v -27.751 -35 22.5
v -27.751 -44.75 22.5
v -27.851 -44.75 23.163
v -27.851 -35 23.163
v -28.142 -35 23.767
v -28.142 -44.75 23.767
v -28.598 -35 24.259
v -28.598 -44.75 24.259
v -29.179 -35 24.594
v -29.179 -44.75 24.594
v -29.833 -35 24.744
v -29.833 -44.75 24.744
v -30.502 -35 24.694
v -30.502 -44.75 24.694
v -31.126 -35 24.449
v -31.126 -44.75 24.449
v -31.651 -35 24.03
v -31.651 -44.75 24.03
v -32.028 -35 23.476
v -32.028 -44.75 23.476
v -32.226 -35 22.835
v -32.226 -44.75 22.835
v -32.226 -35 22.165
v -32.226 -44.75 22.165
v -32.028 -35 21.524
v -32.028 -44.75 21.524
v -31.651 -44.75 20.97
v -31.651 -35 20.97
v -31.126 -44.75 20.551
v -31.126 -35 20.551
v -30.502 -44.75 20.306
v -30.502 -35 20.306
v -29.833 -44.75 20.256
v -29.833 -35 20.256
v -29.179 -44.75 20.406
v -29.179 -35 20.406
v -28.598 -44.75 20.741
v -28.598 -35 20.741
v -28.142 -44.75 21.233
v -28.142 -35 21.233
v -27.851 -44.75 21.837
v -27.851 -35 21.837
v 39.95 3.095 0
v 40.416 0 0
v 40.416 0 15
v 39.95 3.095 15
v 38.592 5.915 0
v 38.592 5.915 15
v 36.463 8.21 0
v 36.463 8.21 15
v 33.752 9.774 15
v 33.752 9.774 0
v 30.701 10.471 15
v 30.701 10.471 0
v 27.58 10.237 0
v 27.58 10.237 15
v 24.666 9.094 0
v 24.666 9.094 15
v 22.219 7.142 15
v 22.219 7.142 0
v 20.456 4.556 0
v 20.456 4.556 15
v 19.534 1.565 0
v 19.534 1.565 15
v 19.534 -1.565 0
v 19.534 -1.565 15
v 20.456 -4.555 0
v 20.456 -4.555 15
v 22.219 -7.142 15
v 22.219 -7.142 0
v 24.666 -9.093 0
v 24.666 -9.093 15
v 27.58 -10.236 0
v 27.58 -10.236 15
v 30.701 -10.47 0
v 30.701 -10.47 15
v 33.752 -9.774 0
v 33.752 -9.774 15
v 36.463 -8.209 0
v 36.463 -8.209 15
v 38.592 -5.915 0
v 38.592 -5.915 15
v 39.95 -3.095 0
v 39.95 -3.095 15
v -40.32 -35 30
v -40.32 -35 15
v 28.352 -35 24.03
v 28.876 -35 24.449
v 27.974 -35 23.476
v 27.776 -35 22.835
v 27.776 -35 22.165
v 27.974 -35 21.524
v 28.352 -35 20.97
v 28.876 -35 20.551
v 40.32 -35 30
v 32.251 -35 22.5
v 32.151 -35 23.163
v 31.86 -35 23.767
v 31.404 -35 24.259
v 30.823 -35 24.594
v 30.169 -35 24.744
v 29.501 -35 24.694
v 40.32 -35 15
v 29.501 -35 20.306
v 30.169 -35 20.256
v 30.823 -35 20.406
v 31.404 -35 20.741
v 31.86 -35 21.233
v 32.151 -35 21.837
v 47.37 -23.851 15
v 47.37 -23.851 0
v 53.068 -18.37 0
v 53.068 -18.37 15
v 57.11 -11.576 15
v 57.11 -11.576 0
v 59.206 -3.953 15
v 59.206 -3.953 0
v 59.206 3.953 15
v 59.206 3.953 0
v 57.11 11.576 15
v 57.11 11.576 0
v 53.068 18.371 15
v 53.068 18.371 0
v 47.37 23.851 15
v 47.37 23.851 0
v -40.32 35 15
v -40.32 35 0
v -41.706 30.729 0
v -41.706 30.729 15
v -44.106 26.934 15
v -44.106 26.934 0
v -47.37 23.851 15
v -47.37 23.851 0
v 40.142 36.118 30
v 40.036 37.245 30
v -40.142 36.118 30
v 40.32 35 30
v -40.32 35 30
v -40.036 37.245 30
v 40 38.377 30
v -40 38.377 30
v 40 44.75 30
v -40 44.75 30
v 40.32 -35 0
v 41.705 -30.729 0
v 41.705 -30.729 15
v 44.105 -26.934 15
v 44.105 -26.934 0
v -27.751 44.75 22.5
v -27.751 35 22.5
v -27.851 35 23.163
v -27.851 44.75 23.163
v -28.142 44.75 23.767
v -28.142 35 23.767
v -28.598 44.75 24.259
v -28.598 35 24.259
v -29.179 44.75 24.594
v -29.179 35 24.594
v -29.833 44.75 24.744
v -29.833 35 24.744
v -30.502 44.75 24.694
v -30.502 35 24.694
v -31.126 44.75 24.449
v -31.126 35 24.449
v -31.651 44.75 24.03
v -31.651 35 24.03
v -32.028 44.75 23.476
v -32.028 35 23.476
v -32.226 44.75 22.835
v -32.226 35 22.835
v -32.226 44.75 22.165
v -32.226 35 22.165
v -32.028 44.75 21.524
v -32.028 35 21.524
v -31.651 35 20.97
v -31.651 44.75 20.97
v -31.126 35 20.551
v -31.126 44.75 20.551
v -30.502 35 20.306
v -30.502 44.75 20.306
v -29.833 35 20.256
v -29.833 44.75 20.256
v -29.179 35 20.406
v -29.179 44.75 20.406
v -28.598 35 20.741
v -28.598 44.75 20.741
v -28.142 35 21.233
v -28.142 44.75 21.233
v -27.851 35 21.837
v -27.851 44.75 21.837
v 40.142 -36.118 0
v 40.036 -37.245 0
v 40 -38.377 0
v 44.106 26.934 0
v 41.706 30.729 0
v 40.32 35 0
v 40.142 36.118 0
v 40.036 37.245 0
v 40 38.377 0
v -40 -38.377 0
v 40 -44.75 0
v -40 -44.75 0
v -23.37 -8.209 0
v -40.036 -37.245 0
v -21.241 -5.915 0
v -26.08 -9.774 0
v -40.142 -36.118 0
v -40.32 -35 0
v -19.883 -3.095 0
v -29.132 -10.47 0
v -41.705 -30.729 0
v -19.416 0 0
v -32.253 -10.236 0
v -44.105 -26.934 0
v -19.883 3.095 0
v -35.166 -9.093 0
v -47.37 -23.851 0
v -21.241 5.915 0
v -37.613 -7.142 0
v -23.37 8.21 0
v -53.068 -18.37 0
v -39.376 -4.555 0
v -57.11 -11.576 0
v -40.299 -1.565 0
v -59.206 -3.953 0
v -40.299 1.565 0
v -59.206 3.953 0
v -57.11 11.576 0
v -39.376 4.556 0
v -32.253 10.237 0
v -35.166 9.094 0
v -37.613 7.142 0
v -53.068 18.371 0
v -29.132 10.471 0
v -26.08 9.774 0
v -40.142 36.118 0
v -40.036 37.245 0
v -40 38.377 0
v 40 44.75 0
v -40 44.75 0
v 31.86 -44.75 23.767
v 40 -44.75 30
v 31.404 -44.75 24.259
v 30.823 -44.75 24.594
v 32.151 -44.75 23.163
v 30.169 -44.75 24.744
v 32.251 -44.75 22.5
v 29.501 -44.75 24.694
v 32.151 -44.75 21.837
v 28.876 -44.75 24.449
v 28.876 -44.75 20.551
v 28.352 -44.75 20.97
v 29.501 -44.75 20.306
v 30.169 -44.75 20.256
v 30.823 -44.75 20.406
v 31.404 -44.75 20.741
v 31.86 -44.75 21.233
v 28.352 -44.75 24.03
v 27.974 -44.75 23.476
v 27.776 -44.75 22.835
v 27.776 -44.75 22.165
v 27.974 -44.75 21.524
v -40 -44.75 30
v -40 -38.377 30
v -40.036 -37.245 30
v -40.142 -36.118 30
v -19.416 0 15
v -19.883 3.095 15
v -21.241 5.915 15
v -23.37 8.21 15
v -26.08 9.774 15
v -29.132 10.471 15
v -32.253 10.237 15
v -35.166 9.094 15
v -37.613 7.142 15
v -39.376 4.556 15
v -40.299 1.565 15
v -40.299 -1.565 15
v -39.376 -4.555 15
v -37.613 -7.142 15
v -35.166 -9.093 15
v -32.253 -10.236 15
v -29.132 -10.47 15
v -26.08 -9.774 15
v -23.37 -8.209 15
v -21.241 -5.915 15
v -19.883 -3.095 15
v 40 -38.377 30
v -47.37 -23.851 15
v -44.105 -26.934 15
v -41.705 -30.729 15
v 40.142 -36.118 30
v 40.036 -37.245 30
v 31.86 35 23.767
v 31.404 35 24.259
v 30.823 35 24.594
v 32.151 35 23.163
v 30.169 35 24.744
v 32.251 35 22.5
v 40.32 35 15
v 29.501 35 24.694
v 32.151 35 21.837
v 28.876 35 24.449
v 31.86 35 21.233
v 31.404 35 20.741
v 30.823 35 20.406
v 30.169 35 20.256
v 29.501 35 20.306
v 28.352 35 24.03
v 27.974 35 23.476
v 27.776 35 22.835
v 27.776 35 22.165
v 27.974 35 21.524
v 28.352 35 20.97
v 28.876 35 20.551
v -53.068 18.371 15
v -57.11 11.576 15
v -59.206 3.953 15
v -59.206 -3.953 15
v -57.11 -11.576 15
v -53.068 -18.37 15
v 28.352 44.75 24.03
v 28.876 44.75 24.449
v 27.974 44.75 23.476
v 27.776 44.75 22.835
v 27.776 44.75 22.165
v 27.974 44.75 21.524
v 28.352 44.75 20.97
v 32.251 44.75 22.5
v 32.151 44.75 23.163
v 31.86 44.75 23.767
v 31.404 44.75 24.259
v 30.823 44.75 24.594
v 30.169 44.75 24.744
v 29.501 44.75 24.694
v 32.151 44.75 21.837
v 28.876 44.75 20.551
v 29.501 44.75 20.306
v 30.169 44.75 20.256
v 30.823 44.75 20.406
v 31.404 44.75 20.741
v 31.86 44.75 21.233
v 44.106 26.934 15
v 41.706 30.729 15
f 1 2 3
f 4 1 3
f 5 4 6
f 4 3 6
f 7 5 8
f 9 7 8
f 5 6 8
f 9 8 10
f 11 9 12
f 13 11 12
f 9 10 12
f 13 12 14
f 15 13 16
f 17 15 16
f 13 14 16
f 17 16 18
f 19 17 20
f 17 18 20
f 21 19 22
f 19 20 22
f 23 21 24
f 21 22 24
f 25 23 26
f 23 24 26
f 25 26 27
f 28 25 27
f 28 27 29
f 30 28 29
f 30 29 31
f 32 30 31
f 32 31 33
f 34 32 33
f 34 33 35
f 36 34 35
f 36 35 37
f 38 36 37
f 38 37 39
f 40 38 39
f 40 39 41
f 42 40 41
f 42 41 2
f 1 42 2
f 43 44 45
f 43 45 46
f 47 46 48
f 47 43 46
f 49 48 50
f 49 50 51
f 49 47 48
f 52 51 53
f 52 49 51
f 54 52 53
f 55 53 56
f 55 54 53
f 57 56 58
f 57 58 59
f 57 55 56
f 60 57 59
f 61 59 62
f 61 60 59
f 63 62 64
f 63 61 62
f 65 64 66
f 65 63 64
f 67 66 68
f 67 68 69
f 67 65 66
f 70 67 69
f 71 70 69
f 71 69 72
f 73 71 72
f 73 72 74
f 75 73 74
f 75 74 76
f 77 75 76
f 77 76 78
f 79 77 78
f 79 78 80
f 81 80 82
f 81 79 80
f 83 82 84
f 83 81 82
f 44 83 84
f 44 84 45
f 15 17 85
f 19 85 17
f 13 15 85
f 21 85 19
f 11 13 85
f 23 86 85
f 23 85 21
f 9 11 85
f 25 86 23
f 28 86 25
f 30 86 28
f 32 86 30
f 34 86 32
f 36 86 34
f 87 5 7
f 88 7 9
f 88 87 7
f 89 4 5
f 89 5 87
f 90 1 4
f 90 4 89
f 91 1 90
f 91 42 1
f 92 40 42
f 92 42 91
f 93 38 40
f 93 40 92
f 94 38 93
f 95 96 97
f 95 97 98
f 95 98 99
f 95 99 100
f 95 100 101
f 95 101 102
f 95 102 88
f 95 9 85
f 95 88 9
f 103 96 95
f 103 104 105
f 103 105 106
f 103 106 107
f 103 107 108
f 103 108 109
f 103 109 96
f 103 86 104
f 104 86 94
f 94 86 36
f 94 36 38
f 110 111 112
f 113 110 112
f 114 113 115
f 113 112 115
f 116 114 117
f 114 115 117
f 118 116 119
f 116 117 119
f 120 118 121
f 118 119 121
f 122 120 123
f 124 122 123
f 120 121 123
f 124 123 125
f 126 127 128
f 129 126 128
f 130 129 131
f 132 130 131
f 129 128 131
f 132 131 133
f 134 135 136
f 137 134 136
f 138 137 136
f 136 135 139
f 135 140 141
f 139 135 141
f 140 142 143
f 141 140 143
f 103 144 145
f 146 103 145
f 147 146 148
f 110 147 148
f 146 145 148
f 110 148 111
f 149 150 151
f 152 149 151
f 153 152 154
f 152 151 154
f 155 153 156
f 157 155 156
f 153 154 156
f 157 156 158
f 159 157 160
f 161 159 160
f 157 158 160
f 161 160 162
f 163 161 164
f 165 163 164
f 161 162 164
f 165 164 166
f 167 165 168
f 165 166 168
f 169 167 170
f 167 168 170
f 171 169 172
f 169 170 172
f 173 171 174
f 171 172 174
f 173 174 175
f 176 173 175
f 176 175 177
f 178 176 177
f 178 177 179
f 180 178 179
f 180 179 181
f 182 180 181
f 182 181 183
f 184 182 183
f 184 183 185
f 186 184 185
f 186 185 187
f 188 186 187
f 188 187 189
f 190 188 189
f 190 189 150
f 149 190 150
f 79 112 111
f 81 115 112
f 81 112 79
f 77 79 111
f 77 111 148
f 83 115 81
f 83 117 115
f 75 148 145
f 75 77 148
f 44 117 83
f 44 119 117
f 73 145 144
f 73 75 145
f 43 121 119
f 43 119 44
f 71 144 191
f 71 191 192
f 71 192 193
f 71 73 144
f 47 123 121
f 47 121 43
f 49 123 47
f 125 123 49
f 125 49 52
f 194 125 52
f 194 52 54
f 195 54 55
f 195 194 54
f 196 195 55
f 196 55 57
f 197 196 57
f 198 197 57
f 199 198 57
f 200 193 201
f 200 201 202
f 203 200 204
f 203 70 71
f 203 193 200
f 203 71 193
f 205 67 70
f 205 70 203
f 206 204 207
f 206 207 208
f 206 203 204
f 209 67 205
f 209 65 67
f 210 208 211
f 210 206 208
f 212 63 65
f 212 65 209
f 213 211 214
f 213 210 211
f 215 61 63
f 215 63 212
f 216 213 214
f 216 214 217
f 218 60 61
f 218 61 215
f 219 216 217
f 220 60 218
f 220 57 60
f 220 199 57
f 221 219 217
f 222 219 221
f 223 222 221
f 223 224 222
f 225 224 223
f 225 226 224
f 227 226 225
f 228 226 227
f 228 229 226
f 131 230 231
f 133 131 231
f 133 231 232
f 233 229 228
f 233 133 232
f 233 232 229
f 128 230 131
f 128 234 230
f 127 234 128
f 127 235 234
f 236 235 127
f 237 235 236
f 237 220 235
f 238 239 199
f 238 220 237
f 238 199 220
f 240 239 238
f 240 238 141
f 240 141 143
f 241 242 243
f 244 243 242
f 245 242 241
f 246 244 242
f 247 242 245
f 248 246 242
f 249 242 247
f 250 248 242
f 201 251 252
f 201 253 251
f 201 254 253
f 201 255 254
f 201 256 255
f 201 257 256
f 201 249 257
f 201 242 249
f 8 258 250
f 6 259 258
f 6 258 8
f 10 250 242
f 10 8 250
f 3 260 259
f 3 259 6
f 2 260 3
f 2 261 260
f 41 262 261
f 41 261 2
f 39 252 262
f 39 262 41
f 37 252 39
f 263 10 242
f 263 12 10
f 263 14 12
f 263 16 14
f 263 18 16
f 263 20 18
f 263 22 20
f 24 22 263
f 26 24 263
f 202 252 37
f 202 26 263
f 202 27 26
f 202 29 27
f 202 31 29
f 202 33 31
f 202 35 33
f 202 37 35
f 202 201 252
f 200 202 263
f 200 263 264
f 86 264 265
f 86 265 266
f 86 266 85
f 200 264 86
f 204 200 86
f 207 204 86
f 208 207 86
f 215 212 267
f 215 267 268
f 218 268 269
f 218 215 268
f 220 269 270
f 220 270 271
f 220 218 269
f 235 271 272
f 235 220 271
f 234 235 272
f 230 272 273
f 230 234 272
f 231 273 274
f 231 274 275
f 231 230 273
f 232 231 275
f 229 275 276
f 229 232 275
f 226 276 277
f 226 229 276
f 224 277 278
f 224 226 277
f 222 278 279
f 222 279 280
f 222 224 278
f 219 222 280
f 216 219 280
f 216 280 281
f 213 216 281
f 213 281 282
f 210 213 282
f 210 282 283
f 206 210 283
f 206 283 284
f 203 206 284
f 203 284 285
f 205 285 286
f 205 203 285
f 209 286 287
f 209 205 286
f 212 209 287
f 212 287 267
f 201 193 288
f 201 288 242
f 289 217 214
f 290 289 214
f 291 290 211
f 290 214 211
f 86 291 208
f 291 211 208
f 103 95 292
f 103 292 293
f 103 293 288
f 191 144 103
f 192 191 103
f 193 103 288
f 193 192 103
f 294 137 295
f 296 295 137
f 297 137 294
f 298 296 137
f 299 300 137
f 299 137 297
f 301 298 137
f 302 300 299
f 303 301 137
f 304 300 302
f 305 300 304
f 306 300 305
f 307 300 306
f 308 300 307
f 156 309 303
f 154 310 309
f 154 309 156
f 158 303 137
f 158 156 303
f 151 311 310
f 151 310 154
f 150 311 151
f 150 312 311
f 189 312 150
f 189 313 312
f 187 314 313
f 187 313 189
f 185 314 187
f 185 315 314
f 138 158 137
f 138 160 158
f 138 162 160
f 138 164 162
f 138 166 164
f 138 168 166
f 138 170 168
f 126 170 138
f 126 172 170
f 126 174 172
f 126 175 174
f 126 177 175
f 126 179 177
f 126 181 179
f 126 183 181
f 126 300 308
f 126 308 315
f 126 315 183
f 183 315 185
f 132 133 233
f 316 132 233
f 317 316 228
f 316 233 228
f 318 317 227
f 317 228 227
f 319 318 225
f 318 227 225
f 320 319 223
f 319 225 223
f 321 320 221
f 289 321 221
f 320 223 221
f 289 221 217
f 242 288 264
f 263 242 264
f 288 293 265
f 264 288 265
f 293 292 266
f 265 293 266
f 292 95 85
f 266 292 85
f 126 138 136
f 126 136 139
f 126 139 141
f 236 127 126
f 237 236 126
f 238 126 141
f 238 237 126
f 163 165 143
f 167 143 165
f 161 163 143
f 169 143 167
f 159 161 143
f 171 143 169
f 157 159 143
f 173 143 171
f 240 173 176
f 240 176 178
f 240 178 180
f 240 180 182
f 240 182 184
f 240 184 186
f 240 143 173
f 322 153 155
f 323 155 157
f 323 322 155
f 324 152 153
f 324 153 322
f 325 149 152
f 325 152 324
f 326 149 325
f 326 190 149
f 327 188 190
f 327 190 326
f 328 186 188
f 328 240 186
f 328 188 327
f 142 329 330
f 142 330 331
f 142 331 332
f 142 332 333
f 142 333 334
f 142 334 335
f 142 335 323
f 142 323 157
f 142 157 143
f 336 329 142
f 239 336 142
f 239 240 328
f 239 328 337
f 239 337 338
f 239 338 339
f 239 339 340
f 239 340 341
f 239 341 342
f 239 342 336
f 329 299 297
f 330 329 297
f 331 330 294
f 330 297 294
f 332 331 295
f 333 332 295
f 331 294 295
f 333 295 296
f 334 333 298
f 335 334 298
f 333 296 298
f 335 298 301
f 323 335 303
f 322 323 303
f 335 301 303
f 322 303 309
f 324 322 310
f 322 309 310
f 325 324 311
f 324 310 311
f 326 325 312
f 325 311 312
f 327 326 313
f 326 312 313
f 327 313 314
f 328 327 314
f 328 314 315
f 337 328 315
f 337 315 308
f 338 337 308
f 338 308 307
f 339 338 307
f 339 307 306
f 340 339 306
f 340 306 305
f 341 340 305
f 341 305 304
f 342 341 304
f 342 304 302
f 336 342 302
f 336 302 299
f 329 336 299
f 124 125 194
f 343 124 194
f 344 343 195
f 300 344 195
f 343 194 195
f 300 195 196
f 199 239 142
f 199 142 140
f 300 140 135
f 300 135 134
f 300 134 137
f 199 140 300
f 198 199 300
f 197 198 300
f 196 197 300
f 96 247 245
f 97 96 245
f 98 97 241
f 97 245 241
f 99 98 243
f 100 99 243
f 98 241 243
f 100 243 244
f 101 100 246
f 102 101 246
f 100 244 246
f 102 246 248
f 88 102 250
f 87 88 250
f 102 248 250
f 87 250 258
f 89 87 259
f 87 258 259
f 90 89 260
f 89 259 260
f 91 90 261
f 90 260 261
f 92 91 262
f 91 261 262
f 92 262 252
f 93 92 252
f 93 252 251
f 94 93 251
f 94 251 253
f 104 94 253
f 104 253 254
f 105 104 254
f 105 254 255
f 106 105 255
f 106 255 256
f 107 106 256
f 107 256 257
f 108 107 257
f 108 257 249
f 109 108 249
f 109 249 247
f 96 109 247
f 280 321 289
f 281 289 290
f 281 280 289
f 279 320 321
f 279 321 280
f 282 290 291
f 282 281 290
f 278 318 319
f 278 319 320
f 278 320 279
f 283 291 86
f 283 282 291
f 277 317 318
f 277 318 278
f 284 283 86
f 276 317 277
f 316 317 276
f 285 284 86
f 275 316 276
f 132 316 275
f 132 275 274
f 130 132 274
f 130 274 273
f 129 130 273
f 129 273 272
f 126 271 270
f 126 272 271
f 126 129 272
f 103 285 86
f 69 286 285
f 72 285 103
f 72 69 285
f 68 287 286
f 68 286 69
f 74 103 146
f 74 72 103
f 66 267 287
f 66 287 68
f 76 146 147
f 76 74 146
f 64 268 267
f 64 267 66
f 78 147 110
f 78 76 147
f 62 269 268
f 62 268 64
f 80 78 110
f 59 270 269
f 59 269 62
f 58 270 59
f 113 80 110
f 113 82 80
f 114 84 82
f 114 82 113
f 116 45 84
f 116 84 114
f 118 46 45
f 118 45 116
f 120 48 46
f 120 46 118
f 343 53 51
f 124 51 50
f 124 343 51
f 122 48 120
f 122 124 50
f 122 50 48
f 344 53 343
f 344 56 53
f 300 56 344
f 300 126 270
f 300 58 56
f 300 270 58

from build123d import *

# Parameters (mm, degrees)
SKETCH1_R               = 10.5
BOSS_EXTRUDE1_DEPTH     = 15
BOSS_EXTRUDE2_DEPTH     = 30
SKETCH2_R               = 2.25
CUT_EXTRUDE1_DEPTH      = 1
CUT_EXTRUDE1_DEPTH_BACK = 90.5


with BuildPart() as part:
    # Sketch1 → Boss-Extrude1 (new body)
    with BuildSketch(Plane.XY):
        with BuildLine():
            Line((-40.319533419, -35), (40.319533419, -35))
            ThreePointArc((40.319533419, -35), (42.786608734, -28.756118968), (47.370059804, -23.850562196))
            ThreePointArc((47.370059804, -23.850562196), (59.471288553, 0.00030559), (47.370059804, 23.851173376))
            ThreePointArc((47.370059804, 23.851173376), (42.786775017, 28.756467199), (40.31965015, 35))
            Line((40.31965015, 35), (-40.31965015, 35))
            ThreePointArc((-40.31965015, 35), (-42.786775017, 28.756467199), (-47.370059804, 23.851173376))
            ThreePointArc((-47.370059804, 23.851173376), (-59.471288553, 0.00030559), (-47.370059804, -23.850562196))
            ThreePointArc((-47.370059804, -23.850562196), (-42.786608734, -28.756118968), (-40.319533419, -35))
        make_face()
        with Locations((29.916288553, 0.00030559)):
            Circle(SKETCH1_R, mode=Mode.SUBTRACT)
        with Locations((-29.916288553, 0.00030559)):
            Circle(SKETCH1_R, mode=Mode.SUBTRACT)
    extrude(amount=BOSS_EXTRUDE1_DEPTH)

    # Sketch1_3 → Boss-Extrude2 (add)
    with BuildSketch(Plane.XY):
        with BuildLine():
            ThreePointArc((-40.31965015, 35), (-40.080090719, 36.681034549), (-40, 38.377162892))
            Line((-40, 38.377162892), (-40, 44.75))
            Line((-40, 44.75), (40, 44.75))
            Line((40, 44.75), (40, 38.377162892))
            ThreePointArc((40, 38.377162892), (40.080090719, 36.681034549), (40.31965015, 35))
            Line((40.31965015, 35), (-40.31965015, 35))
        make_face()
        with BuildLine():
            ThreePointArc((40.319533419, -35), (40.080061405, -36.6807331), (40, -38.376551713))
            Line((40, -38.376551713), (40, -44.75))
            Line((40, -44.75), (-40, -44.75))
            Line((-40, -44.75), (-40, -38.376551713))
            ThreePointArc((-40, -38.376551713), (-40.080061405, -36.6807331), (-40.319533419, -35))
            Line((-40.319533419, -35), (40.319533419, -35))
        make_face()
    extrude(amount=BOSS_EXTRUDE2_DEPTH)

    # Sketch2 → Cut-Extrude1 (cut, two sides)
    with BuildSketch(Plane.XZ.offset(44.75)) as cut_extrude1_sk:
        with Locations((-30.001288553, 22.5)):
            Circle(SKETCH2_R)
        with Locations((30.001288553, 22.5)):
            Circle(SKETCH2_R)
    extrude(amount=CUT_EXTRUDE1_DEPTH, mode=Mode.SUBTRACT)
    extrude(cut_extrude1_sk.sketch, amount=-CUT_EXTRUDE1_DEPTH_BACK, mode=Mode.SUBTRACT)


solid = part.part
